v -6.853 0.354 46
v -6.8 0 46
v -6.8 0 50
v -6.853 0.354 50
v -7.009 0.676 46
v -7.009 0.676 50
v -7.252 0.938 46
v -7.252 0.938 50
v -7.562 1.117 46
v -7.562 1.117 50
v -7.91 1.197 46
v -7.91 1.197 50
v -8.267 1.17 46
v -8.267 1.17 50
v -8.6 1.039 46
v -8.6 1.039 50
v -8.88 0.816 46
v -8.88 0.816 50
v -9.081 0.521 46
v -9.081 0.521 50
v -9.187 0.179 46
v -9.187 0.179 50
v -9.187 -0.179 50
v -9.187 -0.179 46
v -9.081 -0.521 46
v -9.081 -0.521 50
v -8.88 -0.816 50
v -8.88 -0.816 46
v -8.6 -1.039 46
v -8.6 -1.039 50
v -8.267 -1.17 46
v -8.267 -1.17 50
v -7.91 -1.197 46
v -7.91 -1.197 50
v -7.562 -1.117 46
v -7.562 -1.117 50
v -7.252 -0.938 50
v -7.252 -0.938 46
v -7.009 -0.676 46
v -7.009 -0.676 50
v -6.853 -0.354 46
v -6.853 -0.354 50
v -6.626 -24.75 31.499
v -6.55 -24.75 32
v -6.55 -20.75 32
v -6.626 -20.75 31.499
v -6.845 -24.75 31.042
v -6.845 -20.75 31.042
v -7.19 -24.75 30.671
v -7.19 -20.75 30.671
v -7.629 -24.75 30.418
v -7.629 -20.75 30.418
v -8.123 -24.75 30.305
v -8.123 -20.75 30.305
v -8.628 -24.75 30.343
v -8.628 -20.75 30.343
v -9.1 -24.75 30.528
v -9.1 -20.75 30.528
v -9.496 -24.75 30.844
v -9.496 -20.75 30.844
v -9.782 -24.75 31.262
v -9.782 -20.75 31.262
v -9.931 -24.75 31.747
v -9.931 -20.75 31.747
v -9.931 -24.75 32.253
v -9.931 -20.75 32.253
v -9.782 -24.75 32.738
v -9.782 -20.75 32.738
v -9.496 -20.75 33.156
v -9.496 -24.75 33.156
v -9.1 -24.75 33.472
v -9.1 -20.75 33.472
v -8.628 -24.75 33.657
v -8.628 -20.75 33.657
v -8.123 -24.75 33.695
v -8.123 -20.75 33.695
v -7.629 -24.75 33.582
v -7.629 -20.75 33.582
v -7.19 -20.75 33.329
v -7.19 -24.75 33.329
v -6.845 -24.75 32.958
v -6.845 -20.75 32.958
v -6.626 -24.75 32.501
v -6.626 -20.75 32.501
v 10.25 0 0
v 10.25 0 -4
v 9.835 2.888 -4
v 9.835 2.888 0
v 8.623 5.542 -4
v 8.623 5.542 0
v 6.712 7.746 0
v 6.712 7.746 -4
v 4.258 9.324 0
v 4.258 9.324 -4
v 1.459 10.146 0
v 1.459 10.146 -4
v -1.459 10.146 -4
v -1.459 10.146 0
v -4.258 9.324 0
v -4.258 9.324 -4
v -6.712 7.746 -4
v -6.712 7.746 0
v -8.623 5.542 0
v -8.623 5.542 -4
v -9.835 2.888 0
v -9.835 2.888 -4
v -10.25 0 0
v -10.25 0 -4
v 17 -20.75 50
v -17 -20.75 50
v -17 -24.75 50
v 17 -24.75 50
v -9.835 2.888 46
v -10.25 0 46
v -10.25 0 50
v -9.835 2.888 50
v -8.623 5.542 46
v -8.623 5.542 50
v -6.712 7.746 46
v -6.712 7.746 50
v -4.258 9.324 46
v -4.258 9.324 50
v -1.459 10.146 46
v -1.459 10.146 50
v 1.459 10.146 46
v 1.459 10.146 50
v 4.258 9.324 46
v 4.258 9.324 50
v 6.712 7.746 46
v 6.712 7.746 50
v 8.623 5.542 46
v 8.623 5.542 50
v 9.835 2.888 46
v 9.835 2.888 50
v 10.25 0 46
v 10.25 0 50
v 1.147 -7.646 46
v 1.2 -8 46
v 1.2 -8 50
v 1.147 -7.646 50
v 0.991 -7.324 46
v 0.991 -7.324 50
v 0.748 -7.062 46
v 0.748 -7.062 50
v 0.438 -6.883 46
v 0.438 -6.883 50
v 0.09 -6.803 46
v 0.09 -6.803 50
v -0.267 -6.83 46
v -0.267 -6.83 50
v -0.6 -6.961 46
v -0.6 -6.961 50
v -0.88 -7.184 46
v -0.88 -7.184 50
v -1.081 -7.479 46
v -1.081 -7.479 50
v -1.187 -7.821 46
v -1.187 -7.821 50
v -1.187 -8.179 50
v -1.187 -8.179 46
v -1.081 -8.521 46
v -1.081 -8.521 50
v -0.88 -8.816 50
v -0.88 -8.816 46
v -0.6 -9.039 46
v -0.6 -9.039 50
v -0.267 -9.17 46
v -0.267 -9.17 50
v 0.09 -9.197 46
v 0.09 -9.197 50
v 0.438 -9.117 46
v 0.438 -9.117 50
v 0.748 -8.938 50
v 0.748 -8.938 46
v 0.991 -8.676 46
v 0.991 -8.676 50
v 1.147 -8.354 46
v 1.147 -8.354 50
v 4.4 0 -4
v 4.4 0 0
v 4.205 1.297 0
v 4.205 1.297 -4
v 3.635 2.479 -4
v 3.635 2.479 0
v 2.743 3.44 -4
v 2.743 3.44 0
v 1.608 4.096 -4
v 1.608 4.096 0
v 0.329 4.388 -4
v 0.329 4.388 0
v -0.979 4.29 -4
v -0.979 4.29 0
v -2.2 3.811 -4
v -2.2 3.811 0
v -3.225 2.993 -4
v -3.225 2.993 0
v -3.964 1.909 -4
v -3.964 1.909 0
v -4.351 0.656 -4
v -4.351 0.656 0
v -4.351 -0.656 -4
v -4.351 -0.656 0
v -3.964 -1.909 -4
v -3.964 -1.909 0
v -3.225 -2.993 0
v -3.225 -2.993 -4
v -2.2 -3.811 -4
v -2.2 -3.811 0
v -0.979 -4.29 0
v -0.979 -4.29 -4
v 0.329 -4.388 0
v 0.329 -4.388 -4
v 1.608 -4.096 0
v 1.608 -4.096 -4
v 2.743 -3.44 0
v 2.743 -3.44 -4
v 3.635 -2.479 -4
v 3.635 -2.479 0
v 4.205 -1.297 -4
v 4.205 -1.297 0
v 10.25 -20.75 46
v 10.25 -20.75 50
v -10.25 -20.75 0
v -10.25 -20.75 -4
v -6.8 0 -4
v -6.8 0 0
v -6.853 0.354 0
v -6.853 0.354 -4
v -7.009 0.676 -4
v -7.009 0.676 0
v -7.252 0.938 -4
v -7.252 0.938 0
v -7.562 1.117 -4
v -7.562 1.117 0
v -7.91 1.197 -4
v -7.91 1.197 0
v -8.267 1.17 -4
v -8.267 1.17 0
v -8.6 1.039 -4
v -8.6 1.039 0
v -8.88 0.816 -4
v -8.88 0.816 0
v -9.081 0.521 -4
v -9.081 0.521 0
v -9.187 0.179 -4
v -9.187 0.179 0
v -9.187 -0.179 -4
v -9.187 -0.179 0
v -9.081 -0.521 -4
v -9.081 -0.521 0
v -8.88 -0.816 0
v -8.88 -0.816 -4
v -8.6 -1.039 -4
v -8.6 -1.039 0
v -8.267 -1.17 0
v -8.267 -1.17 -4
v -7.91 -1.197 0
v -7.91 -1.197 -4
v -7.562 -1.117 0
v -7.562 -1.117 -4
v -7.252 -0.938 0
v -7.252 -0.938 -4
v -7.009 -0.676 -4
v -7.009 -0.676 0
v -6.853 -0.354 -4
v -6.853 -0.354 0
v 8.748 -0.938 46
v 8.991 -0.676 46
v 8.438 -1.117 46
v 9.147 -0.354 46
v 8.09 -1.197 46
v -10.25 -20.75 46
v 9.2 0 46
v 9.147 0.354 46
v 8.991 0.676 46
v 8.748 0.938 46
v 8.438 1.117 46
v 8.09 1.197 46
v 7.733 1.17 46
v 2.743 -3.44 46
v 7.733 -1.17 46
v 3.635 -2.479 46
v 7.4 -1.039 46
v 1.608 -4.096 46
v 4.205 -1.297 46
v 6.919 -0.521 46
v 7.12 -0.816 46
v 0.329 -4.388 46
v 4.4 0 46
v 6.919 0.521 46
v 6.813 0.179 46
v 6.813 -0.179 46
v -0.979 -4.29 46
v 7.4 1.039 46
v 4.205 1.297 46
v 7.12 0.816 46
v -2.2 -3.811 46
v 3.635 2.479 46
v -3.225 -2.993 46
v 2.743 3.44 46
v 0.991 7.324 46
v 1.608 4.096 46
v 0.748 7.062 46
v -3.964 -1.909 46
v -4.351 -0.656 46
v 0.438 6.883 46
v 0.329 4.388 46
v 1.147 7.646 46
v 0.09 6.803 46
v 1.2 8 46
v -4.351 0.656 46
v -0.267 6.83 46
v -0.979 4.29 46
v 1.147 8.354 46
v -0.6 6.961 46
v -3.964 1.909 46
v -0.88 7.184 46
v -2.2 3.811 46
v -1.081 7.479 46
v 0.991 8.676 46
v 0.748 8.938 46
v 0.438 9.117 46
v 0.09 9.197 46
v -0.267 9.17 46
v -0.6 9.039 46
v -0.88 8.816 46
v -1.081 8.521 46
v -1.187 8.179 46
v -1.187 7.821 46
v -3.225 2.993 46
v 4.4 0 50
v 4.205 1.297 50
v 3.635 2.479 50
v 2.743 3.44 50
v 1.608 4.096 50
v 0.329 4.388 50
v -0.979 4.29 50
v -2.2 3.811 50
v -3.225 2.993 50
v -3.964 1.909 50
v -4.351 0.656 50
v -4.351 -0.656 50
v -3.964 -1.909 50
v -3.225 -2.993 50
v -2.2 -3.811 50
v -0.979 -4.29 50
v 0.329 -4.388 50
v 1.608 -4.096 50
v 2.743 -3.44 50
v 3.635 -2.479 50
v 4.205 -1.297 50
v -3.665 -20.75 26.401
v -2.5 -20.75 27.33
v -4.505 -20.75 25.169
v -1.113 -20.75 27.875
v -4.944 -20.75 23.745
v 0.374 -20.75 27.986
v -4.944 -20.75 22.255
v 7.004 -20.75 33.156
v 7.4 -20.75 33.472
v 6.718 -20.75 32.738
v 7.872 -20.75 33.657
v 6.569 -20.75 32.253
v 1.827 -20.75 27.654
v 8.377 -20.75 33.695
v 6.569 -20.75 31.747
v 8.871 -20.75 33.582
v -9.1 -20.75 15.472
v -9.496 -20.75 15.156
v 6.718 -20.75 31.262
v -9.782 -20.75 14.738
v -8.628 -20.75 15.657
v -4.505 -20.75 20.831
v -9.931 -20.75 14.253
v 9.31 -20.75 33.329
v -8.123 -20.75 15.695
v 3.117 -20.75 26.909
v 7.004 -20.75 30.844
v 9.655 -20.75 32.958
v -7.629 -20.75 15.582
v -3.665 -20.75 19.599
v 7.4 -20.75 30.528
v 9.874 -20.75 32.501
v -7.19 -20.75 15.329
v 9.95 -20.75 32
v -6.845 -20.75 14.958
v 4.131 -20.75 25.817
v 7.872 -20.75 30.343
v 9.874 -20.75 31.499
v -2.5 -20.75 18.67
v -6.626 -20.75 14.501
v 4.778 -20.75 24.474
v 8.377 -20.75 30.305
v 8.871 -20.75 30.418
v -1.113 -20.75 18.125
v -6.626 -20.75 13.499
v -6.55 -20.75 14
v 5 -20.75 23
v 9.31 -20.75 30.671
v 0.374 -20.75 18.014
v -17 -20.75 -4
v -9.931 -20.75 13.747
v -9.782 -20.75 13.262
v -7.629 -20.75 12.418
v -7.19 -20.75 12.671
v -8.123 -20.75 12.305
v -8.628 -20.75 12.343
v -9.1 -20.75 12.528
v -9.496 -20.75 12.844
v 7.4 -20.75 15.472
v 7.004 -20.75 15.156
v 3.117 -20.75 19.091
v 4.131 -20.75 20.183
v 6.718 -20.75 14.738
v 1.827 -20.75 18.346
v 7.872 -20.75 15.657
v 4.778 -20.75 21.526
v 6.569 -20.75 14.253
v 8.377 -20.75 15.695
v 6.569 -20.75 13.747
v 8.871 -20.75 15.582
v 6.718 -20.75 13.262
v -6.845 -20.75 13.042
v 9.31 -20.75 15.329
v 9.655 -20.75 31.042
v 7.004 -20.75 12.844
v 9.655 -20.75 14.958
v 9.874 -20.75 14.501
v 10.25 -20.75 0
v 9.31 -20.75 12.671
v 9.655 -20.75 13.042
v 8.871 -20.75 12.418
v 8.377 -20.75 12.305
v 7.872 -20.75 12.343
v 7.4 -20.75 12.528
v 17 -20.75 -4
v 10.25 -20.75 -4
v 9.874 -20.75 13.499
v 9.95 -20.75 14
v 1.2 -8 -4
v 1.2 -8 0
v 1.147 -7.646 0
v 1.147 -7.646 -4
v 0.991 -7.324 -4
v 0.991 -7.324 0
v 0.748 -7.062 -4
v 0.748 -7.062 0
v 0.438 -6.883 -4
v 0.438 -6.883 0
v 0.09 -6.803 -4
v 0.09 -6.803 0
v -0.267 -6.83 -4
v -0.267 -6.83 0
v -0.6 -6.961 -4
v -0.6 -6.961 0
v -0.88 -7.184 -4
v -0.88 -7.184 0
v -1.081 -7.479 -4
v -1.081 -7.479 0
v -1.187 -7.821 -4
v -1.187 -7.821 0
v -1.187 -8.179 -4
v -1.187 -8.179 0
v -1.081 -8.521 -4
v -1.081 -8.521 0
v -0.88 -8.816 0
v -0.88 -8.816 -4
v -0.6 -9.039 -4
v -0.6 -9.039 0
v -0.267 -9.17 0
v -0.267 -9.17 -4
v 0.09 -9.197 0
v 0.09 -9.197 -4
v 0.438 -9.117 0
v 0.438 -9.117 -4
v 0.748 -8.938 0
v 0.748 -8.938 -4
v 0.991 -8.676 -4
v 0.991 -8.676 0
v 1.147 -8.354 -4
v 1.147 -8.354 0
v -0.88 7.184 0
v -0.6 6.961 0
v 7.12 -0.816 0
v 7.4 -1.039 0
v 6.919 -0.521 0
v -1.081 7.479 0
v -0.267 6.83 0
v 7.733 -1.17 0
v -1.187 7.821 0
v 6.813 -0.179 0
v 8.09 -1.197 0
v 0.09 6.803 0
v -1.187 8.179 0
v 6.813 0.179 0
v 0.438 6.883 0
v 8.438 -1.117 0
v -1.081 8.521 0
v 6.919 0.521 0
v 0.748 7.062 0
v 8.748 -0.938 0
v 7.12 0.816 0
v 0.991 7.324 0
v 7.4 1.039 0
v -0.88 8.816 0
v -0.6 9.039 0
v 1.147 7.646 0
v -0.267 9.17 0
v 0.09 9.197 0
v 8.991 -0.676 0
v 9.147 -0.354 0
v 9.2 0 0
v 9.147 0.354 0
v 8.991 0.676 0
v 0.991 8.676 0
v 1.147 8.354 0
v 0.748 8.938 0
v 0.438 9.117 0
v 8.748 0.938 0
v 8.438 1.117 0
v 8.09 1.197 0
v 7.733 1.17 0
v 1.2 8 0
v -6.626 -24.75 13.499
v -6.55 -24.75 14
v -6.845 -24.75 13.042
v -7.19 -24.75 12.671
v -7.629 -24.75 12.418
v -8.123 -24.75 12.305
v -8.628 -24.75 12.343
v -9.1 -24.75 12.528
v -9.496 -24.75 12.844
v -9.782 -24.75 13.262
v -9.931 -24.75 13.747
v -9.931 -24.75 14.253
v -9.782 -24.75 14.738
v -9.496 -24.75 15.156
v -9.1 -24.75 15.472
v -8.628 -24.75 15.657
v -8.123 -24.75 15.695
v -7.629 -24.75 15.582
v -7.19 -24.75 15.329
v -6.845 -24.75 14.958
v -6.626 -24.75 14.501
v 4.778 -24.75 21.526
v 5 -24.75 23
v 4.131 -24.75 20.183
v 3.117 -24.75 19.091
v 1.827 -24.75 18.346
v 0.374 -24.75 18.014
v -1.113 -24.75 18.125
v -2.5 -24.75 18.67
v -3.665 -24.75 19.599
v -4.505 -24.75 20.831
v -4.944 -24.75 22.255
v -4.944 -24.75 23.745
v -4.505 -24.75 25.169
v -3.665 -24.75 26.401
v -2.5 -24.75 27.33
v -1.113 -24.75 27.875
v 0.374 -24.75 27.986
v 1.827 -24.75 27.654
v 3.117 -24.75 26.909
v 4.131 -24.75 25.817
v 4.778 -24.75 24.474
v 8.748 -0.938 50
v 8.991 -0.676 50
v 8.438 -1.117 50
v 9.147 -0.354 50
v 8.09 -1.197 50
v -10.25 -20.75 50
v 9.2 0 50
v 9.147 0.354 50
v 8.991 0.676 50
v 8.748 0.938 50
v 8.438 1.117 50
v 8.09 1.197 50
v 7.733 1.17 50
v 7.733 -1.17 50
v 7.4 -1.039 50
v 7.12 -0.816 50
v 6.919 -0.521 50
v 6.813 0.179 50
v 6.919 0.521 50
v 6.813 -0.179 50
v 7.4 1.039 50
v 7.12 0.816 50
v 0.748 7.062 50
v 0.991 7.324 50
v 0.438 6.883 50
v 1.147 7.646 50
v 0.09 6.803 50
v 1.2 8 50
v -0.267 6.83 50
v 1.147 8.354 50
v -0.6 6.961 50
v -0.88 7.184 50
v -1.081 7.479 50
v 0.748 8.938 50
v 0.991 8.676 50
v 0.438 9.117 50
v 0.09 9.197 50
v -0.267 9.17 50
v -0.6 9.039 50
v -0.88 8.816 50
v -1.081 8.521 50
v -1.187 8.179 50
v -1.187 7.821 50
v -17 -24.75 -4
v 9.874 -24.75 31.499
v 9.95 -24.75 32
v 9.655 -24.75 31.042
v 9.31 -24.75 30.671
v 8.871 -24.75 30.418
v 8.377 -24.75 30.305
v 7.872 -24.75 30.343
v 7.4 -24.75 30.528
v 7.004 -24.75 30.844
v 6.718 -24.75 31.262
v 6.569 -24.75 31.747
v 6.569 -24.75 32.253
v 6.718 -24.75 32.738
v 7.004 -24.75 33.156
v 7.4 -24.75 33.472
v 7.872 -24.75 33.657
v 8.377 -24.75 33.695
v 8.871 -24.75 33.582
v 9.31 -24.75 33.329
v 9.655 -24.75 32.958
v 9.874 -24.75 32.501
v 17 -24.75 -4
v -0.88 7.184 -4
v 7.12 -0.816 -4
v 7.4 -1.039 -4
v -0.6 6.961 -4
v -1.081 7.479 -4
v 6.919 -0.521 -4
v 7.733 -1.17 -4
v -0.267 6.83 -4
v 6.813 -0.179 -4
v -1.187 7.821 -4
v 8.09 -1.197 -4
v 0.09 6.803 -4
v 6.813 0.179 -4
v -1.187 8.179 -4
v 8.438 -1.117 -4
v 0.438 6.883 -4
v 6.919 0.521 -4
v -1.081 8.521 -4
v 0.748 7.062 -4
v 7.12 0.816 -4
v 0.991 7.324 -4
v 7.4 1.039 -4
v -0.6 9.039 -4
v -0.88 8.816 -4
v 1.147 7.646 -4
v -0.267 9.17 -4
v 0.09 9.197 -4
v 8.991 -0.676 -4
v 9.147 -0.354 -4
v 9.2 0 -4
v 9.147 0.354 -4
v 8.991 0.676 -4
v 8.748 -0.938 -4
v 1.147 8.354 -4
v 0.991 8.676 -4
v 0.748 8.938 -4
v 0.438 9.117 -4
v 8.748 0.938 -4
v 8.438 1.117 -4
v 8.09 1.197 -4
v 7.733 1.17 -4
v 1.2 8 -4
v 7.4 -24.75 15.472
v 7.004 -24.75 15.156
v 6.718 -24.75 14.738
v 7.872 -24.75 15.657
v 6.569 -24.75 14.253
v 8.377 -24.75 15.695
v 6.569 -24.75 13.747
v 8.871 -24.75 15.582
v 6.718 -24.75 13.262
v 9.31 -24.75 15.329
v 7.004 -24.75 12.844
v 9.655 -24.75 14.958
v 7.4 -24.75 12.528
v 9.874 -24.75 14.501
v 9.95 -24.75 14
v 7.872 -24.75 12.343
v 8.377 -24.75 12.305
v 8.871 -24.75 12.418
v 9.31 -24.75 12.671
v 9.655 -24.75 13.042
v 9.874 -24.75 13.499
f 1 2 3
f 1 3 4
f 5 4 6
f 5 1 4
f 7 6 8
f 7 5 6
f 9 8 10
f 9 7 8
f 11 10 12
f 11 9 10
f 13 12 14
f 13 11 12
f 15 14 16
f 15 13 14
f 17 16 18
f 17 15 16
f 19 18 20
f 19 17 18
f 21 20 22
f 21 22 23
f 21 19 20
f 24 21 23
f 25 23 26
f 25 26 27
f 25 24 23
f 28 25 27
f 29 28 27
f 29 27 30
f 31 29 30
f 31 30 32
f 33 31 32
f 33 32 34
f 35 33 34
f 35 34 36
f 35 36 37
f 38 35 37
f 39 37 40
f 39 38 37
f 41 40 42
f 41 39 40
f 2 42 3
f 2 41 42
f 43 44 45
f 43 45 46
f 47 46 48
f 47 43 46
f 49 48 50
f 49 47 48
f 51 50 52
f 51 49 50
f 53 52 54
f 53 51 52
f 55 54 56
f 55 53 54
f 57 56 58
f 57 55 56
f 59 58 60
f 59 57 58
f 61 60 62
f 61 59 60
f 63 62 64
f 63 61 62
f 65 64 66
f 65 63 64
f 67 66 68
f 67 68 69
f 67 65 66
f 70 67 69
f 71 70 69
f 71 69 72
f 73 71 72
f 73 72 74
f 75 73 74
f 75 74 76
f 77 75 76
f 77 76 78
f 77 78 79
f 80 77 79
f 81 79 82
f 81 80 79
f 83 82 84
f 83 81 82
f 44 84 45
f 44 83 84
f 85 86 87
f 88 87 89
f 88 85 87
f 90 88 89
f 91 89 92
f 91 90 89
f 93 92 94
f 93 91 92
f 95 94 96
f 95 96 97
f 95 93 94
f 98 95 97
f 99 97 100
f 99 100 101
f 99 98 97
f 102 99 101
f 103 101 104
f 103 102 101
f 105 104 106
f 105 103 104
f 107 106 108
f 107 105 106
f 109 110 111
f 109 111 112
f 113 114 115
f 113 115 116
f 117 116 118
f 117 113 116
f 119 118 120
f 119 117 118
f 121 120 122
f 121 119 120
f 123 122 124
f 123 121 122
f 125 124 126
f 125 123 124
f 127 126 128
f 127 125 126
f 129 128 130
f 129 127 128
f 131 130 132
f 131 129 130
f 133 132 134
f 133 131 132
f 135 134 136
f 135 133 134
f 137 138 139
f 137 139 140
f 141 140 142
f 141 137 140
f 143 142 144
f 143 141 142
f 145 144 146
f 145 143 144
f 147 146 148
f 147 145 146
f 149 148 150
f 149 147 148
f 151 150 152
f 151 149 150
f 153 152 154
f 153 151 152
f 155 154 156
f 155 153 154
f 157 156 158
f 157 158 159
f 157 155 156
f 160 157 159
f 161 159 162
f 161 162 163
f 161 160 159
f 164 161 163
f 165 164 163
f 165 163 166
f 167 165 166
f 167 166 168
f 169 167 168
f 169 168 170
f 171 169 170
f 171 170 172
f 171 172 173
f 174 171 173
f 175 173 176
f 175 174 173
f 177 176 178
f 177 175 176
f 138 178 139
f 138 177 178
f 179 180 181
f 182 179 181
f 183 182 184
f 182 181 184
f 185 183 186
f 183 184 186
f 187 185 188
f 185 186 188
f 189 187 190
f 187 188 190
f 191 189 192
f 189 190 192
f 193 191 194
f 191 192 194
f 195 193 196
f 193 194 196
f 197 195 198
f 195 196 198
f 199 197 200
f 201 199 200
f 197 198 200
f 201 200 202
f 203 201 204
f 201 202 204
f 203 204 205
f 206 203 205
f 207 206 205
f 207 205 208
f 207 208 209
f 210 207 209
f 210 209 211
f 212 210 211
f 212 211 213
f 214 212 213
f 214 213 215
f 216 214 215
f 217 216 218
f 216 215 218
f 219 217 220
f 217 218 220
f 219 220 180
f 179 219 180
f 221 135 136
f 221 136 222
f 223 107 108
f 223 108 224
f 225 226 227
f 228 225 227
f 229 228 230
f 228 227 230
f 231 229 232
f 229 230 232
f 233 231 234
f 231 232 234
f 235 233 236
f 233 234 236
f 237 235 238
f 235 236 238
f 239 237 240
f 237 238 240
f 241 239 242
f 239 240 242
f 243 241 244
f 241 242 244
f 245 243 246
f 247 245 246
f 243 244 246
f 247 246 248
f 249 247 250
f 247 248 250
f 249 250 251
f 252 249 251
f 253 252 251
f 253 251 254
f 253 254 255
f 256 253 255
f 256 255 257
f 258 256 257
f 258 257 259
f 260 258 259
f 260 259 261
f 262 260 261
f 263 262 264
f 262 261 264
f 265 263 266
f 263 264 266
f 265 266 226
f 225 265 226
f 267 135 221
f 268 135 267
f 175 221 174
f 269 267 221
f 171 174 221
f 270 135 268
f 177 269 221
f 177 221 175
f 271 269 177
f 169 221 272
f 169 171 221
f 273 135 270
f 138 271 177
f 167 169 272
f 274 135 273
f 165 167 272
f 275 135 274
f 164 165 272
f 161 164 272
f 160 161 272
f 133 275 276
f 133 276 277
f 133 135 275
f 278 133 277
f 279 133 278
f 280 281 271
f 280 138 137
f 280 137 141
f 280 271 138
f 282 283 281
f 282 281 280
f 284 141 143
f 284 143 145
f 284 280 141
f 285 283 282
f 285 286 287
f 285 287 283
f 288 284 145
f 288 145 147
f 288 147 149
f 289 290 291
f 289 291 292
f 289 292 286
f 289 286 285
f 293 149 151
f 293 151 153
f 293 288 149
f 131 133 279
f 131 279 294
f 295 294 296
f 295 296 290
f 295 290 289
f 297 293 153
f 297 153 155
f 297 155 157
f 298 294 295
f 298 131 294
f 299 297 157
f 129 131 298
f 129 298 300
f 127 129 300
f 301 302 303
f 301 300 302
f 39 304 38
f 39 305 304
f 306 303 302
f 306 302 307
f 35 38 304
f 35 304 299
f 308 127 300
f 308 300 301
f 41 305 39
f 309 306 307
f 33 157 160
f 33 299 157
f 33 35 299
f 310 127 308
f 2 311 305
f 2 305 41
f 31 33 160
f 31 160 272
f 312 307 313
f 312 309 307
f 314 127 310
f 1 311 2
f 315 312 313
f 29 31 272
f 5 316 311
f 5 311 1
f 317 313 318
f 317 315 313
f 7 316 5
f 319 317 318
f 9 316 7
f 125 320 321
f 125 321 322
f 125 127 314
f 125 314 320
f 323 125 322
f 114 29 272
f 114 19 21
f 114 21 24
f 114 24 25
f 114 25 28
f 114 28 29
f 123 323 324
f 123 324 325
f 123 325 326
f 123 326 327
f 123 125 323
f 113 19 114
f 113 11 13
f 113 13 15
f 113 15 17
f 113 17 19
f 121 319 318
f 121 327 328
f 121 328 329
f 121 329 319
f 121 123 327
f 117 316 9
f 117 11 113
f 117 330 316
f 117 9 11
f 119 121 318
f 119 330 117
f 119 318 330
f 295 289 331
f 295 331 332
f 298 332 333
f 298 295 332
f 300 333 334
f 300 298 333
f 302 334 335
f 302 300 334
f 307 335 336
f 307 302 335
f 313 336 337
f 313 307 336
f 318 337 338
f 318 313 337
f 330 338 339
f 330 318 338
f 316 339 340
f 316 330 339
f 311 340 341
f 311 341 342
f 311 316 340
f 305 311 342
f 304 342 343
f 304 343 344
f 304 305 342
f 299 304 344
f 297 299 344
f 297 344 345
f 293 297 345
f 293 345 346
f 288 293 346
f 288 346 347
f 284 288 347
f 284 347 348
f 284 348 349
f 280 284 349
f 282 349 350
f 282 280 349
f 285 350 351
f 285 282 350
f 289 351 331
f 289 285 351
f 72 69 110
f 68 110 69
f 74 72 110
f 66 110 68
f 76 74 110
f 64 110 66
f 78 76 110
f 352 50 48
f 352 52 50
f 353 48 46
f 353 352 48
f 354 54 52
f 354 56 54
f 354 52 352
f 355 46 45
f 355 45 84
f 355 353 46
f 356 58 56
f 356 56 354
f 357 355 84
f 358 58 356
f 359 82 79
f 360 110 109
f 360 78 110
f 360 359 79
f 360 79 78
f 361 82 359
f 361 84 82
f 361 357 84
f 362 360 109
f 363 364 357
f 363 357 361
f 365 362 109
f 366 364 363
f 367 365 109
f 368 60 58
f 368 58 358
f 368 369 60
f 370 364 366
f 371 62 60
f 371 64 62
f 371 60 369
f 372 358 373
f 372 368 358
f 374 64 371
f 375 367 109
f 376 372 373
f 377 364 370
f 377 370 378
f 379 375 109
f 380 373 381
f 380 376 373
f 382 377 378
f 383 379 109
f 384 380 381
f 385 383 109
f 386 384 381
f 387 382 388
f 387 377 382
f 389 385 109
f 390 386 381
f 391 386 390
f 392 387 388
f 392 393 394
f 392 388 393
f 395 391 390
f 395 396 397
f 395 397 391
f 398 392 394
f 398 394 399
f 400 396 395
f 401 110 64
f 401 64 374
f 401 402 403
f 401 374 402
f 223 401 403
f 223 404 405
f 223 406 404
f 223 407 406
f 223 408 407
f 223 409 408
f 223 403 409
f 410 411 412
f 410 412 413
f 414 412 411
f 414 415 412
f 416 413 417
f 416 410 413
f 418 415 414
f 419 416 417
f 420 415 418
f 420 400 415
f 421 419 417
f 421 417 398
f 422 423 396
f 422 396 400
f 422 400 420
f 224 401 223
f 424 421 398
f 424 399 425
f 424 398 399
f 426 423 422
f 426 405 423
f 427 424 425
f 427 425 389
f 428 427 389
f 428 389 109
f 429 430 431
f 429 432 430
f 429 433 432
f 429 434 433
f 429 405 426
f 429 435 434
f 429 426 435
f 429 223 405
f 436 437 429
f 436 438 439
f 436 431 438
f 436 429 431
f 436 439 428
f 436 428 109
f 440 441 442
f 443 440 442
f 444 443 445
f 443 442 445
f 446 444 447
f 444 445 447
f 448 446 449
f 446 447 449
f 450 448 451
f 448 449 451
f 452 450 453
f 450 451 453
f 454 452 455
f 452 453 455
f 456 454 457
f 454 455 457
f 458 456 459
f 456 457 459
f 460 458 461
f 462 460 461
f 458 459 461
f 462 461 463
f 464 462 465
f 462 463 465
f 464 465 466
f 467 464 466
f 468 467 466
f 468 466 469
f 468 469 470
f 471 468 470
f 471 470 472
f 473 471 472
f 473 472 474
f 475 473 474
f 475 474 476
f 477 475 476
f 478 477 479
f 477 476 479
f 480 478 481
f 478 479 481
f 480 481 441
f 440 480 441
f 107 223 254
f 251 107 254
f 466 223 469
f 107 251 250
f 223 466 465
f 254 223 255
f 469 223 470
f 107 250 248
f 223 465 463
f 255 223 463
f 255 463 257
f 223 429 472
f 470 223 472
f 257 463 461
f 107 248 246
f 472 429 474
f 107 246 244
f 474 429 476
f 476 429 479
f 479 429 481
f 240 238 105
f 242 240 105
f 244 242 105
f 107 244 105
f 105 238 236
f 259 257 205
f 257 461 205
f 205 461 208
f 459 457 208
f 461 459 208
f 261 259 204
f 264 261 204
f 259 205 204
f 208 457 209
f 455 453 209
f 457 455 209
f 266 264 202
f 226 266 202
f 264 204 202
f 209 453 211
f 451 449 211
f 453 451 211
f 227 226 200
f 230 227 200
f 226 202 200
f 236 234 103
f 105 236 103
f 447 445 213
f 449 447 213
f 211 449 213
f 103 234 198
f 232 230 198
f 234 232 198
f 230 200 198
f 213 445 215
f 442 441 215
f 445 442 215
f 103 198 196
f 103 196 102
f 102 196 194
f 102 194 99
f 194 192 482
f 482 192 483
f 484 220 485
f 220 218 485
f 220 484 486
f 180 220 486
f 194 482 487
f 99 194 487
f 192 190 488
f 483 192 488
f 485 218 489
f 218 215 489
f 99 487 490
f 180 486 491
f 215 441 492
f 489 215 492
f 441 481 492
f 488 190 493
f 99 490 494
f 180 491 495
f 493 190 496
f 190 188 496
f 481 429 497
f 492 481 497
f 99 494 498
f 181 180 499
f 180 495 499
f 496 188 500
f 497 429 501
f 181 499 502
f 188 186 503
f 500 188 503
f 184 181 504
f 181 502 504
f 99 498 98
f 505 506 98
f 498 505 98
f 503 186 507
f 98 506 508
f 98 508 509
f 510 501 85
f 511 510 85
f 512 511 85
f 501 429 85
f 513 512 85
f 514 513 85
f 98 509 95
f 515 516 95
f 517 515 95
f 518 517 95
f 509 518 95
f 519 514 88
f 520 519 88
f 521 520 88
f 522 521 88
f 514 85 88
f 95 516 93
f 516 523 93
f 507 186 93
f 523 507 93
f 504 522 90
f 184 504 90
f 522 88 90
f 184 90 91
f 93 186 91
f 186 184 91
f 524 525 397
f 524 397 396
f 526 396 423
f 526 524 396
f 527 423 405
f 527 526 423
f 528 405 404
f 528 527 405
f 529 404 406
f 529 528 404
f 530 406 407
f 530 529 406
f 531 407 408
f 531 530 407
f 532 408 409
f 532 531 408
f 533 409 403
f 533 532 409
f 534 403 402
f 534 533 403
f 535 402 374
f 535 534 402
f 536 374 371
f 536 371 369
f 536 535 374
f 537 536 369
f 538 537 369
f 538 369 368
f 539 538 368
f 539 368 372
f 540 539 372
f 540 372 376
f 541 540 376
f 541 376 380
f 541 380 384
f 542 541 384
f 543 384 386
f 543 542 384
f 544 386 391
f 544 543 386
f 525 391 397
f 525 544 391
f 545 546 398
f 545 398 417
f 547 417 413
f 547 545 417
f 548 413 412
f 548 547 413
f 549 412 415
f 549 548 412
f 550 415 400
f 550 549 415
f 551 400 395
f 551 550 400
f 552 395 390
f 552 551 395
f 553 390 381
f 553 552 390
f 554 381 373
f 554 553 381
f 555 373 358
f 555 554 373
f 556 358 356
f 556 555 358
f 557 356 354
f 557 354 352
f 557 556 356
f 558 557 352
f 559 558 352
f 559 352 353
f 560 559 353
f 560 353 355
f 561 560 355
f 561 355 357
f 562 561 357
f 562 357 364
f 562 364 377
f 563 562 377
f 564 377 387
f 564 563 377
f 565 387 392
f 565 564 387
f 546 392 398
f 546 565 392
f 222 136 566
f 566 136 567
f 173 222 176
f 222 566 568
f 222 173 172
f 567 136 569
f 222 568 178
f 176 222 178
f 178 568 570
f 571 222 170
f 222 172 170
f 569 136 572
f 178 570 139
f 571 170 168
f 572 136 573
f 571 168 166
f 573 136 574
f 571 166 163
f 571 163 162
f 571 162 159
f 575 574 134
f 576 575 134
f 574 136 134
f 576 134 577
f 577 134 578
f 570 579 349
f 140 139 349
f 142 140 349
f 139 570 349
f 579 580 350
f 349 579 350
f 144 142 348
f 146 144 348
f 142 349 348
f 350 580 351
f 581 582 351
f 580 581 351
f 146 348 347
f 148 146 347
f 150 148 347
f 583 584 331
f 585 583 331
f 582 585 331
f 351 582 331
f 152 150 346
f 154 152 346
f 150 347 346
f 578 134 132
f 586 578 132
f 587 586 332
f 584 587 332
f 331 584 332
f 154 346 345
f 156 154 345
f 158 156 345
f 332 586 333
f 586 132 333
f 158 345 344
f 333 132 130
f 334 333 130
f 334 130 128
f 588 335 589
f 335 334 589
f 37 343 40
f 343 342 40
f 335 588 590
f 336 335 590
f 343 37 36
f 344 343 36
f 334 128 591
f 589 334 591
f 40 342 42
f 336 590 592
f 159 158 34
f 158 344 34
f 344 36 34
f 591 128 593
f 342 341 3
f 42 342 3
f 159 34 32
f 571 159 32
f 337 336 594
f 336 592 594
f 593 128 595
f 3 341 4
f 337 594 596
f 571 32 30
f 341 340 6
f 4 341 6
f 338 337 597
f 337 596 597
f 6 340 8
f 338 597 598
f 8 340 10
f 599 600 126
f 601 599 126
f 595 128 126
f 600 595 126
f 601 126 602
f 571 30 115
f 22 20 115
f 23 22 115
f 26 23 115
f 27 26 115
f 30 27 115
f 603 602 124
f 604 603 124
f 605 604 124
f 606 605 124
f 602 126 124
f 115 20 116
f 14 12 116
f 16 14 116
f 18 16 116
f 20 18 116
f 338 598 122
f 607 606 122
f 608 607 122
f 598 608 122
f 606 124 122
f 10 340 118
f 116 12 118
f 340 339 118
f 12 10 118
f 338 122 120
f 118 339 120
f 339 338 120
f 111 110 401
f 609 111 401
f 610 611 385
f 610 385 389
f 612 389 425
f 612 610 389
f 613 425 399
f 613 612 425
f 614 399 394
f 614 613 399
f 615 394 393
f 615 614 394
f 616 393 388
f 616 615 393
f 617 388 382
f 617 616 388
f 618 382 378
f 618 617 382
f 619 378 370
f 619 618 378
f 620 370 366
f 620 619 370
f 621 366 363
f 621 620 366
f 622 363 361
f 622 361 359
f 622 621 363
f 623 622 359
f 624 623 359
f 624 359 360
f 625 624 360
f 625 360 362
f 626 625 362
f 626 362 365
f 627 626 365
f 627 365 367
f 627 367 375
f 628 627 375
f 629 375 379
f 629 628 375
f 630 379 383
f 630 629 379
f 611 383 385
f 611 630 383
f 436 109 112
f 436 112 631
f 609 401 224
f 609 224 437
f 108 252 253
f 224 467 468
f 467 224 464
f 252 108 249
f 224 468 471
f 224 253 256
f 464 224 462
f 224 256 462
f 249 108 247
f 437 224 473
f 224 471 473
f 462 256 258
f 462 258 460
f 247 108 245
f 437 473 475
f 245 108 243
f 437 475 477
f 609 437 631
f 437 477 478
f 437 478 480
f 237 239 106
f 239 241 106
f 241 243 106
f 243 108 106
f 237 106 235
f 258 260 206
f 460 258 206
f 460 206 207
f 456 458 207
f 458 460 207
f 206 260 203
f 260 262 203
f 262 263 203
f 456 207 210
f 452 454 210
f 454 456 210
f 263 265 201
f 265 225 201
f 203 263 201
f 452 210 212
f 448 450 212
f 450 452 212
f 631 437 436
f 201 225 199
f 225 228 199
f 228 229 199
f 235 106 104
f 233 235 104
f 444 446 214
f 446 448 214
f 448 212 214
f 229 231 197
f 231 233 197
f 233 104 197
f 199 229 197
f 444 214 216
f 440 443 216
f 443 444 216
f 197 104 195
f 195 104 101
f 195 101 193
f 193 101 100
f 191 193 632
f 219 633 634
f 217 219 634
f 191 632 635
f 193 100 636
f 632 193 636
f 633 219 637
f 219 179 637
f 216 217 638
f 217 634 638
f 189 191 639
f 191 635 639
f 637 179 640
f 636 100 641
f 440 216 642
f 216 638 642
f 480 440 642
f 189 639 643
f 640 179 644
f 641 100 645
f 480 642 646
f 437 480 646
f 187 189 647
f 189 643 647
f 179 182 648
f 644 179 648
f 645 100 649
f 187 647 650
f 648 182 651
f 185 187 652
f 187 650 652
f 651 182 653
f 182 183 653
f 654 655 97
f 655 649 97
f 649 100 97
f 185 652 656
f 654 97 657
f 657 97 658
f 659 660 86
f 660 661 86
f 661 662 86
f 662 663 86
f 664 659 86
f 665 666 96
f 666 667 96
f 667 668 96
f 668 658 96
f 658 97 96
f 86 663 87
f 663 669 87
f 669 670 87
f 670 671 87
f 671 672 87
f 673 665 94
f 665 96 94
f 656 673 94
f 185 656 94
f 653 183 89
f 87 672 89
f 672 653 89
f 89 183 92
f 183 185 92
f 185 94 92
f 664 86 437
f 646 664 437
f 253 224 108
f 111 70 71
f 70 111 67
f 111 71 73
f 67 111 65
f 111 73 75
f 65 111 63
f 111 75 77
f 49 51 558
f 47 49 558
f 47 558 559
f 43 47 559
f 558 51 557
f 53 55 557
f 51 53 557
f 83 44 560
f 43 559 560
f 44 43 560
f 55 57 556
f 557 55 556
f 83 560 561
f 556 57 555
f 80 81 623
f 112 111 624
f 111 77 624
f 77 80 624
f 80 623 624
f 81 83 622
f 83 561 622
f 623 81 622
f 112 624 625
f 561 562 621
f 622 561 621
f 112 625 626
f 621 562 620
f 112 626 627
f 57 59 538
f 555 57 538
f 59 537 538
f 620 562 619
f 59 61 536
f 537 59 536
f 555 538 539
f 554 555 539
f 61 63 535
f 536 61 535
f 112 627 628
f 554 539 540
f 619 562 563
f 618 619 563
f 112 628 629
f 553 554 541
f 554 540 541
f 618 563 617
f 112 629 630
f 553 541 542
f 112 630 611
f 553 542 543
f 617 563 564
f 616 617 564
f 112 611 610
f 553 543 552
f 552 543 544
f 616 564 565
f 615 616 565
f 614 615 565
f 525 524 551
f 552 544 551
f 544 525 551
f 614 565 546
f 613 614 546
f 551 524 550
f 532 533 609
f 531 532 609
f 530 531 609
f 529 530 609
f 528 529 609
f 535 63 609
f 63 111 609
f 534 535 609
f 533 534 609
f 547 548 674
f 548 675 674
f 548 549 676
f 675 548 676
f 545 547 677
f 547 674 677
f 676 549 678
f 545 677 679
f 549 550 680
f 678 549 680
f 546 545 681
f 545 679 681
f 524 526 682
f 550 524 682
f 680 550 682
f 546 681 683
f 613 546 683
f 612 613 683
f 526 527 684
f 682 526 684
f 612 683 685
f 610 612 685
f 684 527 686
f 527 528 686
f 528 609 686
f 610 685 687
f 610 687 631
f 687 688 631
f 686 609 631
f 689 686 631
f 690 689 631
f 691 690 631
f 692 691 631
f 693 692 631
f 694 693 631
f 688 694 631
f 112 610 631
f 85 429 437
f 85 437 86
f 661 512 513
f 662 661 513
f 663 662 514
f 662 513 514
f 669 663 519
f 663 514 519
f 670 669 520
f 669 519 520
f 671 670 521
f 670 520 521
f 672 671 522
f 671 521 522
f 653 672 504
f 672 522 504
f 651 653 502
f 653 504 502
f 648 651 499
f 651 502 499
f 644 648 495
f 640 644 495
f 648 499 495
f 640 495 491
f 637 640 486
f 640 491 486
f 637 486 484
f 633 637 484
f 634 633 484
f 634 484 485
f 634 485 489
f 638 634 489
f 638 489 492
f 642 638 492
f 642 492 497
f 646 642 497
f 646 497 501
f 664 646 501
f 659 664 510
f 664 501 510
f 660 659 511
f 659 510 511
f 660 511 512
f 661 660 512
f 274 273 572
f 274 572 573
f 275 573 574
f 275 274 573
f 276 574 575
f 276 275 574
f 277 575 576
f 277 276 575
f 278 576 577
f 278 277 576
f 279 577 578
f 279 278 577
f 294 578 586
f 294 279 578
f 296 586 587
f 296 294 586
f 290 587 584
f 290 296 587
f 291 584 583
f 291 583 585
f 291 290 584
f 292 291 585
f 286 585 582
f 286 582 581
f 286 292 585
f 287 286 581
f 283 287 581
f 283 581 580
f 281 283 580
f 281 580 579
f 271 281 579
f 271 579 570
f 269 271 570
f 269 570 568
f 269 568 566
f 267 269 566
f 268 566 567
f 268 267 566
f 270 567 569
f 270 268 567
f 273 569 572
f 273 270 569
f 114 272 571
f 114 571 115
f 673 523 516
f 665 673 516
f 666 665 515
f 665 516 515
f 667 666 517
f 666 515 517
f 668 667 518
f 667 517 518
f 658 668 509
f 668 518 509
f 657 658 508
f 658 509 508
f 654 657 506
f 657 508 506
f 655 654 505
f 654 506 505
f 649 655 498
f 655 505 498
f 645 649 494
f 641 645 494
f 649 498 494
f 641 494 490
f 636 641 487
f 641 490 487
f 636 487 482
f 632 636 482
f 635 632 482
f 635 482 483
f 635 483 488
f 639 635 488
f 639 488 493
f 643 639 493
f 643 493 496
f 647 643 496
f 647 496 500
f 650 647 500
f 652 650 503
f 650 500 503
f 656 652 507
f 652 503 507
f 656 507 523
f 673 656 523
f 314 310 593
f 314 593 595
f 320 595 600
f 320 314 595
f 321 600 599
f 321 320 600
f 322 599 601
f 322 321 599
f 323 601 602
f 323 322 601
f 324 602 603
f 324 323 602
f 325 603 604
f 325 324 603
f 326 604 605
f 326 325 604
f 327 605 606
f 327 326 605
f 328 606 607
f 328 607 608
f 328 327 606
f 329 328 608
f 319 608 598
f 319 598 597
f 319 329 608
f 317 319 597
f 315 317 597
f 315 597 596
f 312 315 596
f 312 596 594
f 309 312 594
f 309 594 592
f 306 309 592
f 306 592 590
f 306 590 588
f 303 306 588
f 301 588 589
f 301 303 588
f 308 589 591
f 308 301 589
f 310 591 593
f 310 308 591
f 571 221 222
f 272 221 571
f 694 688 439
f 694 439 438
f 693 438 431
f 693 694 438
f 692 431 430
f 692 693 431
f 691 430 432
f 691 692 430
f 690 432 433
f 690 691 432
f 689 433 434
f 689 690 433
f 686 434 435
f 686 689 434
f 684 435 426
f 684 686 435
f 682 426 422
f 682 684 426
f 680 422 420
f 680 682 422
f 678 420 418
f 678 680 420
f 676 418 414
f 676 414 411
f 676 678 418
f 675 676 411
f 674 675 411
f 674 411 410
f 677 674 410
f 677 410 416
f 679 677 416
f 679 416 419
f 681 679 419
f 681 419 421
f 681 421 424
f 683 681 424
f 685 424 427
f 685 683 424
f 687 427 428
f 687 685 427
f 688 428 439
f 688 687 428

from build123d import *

# Parameters (mm, degrees)
SKETCH1_R           = 1.2
SKETCH1_R_2         = 4.4
BOSS_EXTRUDE1_DEPTH = 4
SKETCH3_W           = 34
SKETCH3_H           = 46
SKETCH3_R           = 5
SKETCH3_R_2         = 1.7
BOSS_EXTRUDE3_DEPTH = 4
SKETCH4_R           = 1.7
SKETCH4_R_2         = 5
BOSS_EXTRUDE4_DEPTH = 4
SKETCH5_W           = 46
SKETCH5_H           = 4
CUT_EXTRUDE1_DEPTH  = 65.020016401
SKETCH6_W           = 34
SKETCH6_H           = 4
BOSS_EXTRUDE5_DEPTH = 4
SKETCH7_R           = 4.4
SKETCH7_R_2         = 1.2
BOSS_EXTRUDE6_DEPTH = 4
SKETCH8_W           = 46
SKETCH8_H           = 31
SKETCH8_W_2         = 4
SKETCH8_H_2         = 4
CUT_EXTRUDE2_DEPTH  = 67.951941719


with BuildPart() as part:
    # Sketch1 → Boss-Extrude1 (new body)
    with BuildSketch(Plane.XY):
        with BuildLine():
            Line((-10.25, -28.75), (10.25, -28.75))
            Line((10.25, -28.75), (10.25, 0))
            ThreePointArc((10.25, 0), (0, 10.25), (-10.25, 0))
            Line((-10.25, 0), (-10.25, -28.75))
        make_face()
        with Locations((0, 8)):
            Circle(SKETCH1_R, mode=Mode.SUBTRACT)
        with Locations((-8, 0)):
            Circle(SKETCH1_R, mode=Mode.SUBTRACT)
        with Locations((0, -8)):
            Circle(SKETCH1_R, mode=Mode.SUBTRACT)
        with Locations((8, 0)):
            Circle(SKETCH1_R, mode=Mode.SUBTRACT)
        Circle(SKETCH1_R_2, mode=Mode.SUBTRACT)
    boss_extrude1 = extrude(amount=BOSS_EXTRUDE1_DEPTH)

    # Sketch3 → Boss-Extrude3 (add)
    with BuildSketch(Plane(origin=(0, -28.75, 0), x_dir=(-1, 0, 0), z_dir=(0, -1, 0))):
        with Locations((0, -23)):
            Rectangle(SKETCH3_W, SKETCH3_H)
        with Locations(Location((0, -23, 0), (0, 0, 180))):
            Circle(SKETCH3_R, mode=Mode.SUBTRACT)
        with Locations(Location((-8.25, -14, 0), (0, 0, 180))):
            Circle(SKETCH3_R_2, mode=Mode.SUBTRACT)
        with Locations(Location((8.25, -14, 0), (0, 0, 180))):
            Circle(SKETCH3_R_2, mode=Mode.SUBTRACT)
        with Locations(Location((8.25, -32, 0), (0, 0, 180))):
            Circle(SKETCH3_R_2, mode=Mode.SUBTRACT)
        with Locations(Location((-8.25, -32, 0), (0, 0, 180))):
            Circle(SKETCH3_R_2, mode=Mode.SUBTRACT)
    extrude(amount=-BOSS_EXTRUDE3_DEPTH)

    # Mirror1: Boss-Extrude1 across plane
    add(boss_extrude1.mirror(Plane.XY.offset(23)))

    # Sketch4 → Boss-Extrude4 (add)
    with BuildSketch(Plane(origin=(0, -24.75, 0), x_dir=(1, 0, 0), z_dir=(0, 1, 0))):
        Polygon((-10.25, -42), (10.25, -42), (10.25, -46), (17, -46), (17, 0), (10.25, 0), (10.25, -4), (-10.25, -4), (-10.25, 0), (-17, 0), (-17, -46), (-10.25, -46), align=None)
        with Locations((8.25, -14)):
            Circle(SKETCH4_R, mode=Mode.SUBTRACT)
        with Locations((-8.25, -32)):
            Circle(SKETCH4_R, mode=Mode.SUBTRACT)
        with Locations((8.25, -32)):
            Circle(SKETCH4_R, mode=Mode.SUBTRACT)
        with Locations((-8.25, -14)):
            Circle(SKETCH4_R, mode=Mode.SUBTRACT)
        with Locations((0, -23)):
            Circle(SKETCH4_R_2, mode=Mode.SUBTRACT)
    extrude(amount=BOSS_EXTRUDE4_DEPTH)

    # Sketch5 → Cut-Extrude1 (cut, through all)
    with BuildSketch(Plane.ZY.offset(17)):
        with Locations((23, -26.75)):
            Rectangle(SKETCH5_W, SKETCH5_H)
    extrude(amount=-CUT_EXTRUDE1_DEPTH, mode=Mode.SUBTRACT)

    # Sketch6 → Boss-Extrude5 (add)
    with BuildSketch(Plane(origin=(0, -20.75, 0), x_dir=(1, 0, 0), z_dir=(0, 1, 0))):
        with Locations((0, 2)):
            Rectangle(SKETCH6_W, SKETCH6_H)
        with Locations((0, -48)):
            Rectangle(SKETCH6_W, SKETCH6_H)
    extrude(amount=-BOSS_EXTRUDE5_DEPTH)

    # Mirror2: Boss-Extrude1 across plane
    add(boss_extrude1.mirror(Plane(origin=(0, 0, 0), x_dir=(1, 0, 0), z_dir=(0, 0, -1))))

    # Sketch8 → Cut-Extrude2 (cut, through all)
    with BuildSketch(Plane(origin=(17, 0, 0), x_dir=(0, 0, -1), z_dir=(1, 0, 0))):
        with Locations((-23, -5.25)):
            Rectangle(SKETCH8_W, SKETCH8_H)
        with Locations((2, -26.75)):
            Rectangle(SKETCH8_W_2, SKETCH8_H_2)
    extrude(amount=-CUT_EXTRUDE2_DEPTH, mode=Mode.SUBTRACT)


with BuildPart() as body_2:
    # Sketch7 → Boss-Extrude6 (new body)
    with BuildSketch(Plane.XY.offset(46)):
        with BuildLine():
            Line((10.25, -20.75), (-10.25, -20.75))
            Line((-10.25, -20.75), (-10.25, 0))
            ThreePointArc((-10.25, 0), (0, 10.25), (10.25, 0))
            Line((10.25, 0), (10.25, -20.75))
        make_face()
        Circle(SKETCH7_R, mode=Mode.SUBTRACT)
        with Locations((8, 0)):
            Circle(SKETCH7_R_2, mode=Mode.SUBTRACT)
        with Locations((0, -8)):
            Circle(SKETCH7_R_2, mode=Mode.SUBTRACT)
        with Locations((-8, 0)):
            Circle(SKETCH7_R_2, mode=Mode.SUBTRACT)
        with Locations((0, 8)):
            Circle(SKETCH7_R_2, mode=Mode.SUBTRACT)
    extrude(amount=BOSS_EXTRUDE6_DEPTH)


solid = Compound([part.part, body_2.part])
